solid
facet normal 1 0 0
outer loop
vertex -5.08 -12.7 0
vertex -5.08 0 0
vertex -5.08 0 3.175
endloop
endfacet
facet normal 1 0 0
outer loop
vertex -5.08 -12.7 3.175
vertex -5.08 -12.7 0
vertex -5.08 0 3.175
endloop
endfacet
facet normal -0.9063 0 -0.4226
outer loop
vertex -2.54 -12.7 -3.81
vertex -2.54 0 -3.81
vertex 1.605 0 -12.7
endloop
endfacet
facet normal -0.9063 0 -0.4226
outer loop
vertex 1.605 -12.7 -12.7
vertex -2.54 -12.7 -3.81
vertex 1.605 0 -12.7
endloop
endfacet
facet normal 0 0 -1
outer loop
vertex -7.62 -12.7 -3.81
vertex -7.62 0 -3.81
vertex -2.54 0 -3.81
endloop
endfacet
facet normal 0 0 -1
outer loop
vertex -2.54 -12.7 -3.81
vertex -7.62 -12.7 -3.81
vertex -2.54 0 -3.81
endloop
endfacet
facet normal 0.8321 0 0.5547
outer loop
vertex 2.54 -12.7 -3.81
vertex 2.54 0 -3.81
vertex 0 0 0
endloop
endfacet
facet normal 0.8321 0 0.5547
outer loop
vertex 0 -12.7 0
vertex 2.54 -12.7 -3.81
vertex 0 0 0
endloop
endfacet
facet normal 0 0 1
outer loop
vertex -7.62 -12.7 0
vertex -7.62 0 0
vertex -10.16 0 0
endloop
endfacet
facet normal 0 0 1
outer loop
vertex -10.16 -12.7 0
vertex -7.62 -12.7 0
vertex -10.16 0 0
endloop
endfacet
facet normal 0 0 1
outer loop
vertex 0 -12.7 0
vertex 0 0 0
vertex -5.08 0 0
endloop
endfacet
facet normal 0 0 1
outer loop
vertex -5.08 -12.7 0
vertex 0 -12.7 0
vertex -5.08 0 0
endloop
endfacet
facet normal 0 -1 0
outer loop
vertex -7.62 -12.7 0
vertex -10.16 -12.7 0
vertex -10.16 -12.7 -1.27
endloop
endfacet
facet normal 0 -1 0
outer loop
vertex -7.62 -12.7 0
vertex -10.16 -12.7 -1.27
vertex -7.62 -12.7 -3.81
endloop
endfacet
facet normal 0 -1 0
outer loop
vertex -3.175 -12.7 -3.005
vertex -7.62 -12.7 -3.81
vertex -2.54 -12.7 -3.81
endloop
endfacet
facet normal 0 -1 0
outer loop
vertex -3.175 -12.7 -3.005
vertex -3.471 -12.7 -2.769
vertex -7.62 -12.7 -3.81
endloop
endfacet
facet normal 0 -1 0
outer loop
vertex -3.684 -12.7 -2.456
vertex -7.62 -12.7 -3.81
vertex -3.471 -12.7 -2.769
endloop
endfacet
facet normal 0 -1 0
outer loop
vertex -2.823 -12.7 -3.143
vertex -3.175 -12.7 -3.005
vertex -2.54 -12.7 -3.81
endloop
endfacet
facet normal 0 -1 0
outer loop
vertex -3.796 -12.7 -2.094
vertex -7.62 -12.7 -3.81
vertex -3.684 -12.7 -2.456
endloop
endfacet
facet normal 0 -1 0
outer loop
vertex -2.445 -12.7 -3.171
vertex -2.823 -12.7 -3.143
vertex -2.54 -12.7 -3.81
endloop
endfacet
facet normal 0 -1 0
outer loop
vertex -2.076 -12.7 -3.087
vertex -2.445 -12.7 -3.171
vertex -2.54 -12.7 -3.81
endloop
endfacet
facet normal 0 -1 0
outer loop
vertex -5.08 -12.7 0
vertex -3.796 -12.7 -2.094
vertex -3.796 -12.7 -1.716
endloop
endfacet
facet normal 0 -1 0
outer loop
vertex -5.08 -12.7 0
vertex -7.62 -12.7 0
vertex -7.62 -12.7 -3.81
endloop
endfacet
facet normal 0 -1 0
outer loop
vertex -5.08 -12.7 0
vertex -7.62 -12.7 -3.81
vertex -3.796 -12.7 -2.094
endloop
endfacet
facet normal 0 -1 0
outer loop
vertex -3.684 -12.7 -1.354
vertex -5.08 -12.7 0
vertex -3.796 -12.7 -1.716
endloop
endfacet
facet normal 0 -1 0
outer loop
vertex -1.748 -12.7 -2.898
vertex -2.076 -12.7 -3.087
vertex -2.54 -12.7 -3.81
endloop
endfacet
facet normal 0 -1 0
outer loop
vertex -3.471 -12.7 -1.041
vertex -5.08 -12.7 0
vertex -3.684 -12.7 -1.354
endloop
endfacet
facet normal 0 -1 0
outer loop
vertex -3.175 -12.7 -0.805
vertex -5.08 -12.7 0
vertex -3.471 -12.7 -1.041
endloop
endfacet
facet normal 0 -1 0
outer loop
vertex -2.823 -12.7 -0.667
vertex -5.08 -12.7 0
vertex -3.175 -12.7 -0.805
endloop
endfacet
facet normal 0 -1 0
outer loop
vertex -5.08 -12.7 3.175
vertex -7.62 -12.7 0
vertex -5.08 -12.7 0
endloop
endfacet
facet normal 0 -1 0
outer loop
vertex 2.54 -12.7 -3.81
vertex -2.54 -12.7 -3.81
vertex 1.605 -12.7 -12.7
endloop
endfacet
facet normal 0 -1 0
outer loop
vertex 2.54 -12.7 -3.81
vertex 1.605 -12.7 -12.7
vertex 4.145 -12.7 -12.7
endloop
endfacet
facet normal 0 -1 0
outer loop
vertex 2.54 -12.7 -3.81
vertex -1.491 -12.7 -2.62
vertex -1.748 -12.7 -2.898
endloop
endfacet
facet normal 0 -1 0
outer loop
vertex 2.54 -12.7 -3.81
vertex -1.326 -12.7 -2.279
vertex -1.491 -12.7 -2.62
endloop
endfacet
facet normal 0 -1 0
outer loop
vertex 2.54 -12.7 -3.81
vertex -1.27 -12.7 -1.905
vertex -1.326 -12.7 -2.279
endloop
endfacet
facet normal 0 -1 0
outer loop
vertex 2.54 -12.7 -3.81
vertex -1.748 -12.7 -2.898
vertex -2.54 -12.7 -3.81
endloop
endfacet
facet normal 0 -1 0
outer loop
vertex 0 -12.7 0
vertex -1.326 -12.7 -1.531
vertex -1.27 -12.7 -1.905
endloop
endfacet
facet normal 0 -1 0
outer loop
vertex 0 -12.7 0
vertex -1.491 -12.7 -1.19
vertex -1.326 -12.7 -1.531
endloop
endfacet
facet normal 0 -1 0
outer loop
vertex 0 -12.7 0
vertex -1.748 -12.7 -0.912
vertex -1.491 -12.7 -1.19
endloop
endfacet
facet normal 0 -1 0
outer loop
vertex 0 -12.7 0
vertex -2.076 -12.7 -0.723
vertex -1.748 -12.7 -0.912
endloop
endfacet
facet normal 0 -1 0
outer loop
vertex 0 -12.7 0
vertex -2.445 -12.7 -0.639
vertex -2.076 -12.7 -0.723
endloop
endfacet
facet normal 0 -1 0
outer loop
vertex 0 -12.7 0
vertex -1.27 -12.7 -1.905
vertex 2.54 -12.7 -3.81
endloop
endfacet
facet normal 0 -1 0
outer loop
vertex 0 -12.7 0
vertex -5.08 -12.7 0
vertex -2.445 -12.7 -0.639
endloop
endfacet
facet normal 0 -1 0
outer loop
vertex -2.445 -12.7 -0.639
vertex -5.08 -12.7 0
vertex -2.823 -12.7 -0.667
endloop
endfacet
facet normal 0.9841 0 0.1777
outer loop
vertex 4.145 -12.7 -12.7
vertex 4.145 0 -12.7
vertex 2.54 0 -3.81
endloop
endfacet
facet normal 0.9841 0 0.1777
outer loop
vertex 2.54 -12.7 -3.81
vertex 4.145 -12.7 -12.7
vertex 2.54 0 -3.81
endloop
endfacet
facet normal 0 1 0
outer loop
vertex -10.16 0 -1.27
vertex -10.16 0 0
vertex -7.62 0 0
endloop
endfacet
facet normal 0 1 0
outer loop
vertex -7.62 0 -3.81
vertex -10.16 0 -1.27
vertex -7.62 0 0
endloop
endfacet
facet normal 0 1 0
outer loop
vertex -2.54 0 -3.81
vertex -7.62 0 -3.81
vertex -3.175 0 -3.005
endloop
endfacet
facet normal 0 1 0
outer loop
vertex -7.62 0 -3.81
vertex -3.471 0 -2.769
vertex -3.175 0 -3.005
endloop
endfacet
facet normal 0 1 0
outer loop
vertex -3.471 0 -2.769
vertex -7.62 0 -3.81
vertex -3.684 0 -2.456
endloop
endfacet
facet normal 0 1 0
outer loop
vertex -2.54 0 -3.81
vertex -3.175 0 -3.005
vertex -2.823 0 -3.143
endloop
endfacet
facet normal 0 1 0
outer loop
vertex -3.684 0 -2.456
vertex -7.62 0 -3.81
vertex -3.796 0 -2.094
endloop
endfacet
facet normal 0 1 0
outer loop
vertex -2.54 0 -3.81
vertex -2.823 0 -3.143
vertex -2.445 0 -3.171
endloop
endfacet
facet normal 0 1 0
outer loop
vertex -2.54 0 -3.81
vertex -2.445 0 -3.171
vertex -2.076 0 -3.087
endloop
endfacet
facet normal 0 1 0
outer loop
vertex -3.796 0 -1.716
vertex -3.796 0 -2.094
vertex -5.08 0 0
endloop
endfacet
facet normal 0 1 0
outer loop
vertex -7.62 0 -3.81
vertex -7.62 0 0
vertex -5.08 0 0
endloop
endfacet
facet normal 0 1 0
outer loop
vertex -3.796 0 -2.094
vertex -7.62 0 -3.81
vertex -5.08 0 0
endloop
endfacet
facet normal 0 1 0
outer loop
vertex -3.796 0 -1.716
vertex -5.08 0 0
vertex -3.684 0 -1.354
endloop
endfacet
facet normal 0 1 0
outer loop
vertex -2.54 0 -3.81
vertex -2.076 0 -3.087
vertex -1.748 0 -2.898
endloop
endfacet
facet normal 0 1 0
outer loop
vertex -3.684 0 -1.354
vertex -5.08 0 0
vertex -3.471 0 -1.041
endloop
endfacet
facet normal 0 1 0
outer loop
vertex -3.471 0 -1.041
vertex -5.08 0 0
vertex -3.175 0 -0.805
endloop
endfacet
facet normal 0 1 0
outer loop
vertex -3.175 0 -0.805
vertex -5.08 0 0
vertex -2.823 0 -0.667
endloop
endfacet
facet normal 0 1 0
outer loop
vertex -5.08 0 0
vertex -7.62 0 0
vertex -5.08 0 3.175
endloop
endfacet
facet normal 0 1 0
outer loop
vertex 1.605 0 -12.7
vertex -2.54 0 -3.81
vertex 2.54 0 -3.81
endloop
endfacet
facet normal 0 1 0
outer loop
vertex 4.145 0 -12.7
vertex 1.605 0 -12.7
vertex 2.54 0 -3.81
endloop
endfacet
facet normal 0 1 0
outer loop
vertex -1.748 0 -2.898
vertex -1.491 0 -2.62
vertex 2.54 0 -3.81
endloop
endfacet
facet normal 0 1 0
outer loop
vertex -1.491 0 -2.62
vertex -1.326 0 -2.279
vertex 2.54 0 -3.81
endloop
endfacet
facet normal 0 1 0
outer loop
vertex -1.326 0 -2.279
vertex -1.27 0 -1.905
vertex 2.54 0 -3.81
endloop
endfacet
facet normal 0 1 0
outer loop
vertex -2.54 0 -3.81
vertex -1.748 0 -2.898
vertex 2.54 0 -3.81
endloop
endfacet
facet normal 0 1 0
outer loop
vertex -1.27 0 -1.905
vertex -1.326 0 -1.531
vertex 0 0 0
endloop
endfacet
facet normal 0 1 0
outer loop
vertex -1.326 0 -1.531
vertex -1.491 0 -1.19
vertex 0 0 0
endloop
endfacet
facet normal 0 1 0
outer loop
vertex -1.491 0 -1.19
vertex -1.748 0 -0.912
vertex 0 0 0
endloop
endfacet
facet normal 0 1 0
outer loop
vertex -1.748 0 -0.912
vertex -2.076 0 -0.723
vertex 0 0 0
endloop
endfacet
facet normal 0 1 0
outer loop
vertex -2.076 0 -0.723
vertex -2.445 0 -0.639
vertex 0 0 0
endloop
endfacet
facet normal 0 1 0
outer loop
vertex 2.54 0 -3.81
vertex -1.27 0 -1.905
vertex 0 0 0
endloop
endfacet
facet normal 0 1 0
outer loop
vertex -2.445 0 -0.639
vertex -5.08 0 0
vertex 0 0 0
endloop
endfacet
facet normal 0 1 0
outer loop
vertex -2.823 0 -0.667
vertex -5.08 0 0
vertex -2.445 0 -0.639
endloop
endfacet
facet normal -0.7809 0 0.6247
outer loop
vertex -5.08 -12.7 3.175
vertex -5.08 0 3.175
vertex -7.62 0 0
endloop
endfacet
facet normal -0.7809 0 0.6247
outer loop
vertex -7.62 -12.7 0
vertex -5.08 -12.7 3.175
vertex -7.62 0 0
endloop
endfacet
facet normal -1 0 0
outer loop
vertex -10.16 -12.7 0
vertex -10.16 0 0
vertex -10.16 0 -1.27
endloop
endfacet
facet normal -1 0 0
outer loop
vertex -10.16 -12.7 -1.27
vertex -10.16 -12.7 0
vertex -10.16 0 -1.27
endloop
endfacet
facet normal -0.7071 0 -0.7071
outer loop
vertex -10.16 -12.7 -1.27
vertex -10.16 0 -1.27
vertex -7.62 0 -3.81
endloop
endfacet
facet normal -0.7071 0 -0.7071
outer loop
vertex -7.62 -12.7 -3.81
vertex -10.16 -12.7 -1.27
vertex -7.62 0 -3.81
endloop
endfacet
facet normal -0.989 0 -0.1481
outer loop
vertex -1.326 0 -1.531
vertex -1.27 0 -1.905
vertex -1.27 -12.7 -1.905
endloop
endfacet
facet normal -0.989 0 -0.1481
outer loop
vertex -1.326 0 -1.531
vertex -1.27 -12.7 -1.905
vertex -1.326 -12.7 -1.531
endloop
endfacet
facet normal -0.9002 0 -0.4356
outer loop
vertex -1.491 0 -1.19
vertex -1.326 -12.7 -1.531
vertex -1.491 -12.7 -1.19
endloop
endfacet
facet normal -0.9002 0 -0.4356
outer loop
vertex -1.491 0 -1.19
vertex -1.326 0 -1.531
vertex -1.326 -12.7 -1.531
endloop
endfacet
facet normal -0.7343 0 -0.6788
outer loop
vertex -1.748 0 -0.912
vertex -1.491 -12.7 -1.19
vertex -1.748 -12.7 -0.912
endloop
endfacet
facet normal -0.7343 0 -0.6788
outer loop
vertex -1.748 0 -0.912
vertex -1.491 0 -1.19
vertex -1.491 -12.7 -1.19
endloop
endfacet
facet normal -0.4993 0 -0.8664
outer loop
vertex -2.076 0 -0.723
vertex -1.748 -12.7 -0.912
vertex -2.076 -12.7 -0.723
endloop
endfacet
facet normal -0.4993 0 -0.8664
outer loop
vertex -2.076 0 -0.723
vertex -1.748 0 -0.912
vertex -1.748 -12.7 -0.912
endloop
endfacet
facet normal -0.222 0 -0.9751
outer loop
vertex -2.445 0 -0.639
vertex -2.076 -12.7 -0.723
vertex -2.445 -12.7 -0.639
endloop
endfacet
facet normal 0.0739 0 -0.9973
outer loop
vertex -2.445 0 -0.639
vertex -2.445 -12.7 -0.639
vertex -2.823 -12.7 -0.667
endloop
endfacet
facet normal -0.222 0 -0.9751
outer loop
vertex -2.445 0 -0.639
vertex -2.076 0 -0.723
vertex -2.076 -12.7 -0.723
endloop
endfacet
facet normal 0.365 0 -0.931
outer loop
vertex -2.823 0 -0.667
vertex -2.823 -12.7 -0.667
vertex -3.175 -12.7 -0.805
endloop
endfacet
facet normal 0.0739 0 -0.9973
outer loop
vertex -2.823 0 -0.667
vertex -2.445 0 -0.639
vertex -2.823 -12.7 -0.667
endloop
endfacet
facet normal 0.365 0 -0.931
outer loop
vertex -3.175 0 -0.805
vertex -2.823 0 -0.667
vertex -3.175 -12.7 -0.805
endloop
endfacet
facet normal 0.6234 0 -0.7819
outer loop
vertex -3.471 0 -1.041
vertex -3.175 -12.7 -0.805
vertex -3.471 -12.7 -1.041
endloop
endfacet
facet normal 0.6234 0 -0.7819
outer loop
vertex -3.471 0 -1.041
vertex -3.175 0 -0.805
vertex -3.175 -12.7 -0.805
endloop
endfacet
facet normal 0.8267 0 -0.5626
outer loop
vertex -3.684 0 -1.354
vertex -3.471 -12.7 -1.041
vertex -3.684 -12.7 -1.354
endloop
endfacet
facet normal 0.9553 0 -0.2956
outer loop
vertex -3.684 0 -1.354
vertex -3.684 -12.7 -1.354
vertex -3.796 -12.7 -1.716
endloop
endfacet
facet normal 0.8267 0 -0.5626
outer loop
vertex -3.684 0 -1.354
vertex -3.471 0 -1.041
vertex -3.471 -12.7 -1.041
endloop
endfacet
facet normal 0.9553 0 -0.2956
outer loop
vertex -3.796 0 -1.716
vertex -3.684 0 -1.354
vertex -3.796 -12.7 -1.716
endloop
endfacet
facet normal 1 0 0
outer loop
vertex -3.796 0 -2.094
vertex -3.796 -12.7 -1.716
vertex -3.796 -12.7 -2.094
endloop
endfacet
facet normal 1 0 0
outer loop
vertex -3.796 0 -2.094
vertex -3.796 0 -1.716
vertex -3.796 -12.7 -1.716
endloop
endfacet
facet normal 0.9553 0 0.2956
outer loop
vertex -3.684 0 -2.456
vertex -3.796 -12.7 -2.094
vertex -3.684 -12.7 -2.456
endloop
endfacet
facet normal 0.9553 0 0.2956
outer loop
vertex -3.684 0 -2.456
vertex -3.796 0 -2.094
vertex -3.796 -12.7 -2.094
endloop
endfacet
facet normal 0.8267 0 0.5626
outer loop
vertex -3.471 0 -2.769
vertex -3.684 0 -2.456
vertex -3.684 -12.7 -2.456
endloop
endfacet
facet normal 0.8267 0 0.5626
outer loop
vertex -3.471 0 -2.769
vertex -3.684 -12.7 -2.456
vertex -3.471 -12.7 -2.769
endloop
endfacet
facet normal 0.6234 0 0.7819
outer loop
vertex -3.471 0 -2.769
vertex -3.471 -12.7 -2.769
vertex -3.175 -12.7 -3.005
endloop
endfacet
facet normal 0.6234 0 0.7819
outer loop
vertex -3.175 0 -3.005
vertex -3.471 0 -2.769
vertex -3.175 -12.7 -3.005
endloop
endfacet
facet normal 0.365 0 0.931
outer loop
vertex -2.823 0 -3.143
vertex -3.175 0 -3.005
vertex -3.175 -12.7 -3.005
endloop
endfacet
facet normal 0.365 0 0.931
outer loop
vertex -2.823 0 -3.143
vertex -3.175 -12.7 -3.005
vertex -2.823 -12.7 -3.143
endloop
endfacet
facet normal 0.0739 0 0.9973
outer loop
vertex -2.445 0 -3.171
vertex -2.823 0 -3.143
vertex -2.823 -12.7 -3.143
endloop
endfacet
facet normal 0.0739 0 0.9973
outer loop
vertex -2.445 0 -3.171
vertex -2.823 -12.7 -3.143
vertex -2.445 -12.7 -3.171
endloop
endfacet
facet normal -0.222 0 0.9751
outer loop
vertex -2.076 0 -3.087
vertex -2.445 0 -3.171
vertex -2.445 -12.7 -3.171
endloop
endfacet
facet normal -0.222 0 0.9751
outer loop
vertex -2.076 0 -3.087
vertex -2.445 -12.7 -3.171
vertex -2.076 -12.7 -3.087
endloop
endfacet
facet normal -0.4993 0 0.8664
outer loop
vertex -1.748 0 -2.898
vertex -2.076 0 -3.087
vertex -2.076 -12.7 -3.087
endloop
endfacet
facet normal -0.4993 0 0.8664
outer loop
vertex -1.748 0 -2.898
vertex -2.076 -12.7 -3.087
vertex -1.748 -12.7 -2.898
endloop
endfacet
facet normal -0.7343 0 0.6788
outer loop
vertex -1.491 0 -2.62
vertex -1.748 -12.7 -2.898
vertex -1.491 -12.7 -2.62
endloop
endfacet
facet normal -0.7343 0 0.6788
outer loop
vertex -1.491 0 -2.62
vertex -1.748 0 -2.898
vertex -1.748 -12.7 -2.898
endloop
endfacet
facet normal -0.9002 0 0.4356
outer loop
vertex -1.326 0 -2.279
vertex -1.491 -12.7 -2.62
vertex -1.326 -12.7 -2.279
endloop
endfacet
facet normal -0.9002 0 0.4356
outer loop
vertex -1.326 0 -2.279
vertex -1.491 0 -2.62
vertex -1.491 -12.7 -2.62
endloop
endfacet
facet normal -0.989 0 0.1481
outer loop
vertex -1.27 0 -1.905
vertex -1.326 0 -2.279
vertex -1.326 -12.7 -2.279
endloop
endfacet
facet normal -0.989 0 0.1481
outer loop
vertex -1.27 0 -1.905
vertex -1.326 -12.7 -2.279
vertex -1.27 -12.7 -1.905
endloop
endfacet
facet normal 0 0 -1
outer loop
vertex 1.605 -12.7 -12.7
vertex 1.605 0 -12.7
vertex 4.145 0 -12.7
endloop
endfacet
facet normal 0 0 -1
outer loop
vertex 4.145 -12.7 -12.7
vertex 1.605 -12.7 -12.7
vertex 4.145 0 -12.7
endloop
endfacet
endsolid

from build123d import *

# Parameters (mm, degrees)
F0_R     = 1.27
F1_DEPTH = 12.7


# Not quite as in the source:
# - a feature names something its author has since deleted; it is built from what else it names


with BuildPart() as f1:
    # F0 (on Front) → F1 (new body)
    with BuildSketch(Plane.XZ):
        Polygon((2.54, -3.81), (0, 0), (-5.08, 0), (-7.62, 0), (-10.16, 0), (-10.16, -1.27), (-7.62, -3.81), (-2.54, -3.81), (1.605475081, -12.7), (4.145475081, -12.7), align=None)
        with Locations((-2.54, -1.905)):
            Circle(F0_R, mode=Mode.SUBTRACT)
        Polygon((-7.62, 0), (-5.08, 0), (-5.08, 3.175), align=None)
    extrude(amount=F1_DEPTH)


solid = f1.part
